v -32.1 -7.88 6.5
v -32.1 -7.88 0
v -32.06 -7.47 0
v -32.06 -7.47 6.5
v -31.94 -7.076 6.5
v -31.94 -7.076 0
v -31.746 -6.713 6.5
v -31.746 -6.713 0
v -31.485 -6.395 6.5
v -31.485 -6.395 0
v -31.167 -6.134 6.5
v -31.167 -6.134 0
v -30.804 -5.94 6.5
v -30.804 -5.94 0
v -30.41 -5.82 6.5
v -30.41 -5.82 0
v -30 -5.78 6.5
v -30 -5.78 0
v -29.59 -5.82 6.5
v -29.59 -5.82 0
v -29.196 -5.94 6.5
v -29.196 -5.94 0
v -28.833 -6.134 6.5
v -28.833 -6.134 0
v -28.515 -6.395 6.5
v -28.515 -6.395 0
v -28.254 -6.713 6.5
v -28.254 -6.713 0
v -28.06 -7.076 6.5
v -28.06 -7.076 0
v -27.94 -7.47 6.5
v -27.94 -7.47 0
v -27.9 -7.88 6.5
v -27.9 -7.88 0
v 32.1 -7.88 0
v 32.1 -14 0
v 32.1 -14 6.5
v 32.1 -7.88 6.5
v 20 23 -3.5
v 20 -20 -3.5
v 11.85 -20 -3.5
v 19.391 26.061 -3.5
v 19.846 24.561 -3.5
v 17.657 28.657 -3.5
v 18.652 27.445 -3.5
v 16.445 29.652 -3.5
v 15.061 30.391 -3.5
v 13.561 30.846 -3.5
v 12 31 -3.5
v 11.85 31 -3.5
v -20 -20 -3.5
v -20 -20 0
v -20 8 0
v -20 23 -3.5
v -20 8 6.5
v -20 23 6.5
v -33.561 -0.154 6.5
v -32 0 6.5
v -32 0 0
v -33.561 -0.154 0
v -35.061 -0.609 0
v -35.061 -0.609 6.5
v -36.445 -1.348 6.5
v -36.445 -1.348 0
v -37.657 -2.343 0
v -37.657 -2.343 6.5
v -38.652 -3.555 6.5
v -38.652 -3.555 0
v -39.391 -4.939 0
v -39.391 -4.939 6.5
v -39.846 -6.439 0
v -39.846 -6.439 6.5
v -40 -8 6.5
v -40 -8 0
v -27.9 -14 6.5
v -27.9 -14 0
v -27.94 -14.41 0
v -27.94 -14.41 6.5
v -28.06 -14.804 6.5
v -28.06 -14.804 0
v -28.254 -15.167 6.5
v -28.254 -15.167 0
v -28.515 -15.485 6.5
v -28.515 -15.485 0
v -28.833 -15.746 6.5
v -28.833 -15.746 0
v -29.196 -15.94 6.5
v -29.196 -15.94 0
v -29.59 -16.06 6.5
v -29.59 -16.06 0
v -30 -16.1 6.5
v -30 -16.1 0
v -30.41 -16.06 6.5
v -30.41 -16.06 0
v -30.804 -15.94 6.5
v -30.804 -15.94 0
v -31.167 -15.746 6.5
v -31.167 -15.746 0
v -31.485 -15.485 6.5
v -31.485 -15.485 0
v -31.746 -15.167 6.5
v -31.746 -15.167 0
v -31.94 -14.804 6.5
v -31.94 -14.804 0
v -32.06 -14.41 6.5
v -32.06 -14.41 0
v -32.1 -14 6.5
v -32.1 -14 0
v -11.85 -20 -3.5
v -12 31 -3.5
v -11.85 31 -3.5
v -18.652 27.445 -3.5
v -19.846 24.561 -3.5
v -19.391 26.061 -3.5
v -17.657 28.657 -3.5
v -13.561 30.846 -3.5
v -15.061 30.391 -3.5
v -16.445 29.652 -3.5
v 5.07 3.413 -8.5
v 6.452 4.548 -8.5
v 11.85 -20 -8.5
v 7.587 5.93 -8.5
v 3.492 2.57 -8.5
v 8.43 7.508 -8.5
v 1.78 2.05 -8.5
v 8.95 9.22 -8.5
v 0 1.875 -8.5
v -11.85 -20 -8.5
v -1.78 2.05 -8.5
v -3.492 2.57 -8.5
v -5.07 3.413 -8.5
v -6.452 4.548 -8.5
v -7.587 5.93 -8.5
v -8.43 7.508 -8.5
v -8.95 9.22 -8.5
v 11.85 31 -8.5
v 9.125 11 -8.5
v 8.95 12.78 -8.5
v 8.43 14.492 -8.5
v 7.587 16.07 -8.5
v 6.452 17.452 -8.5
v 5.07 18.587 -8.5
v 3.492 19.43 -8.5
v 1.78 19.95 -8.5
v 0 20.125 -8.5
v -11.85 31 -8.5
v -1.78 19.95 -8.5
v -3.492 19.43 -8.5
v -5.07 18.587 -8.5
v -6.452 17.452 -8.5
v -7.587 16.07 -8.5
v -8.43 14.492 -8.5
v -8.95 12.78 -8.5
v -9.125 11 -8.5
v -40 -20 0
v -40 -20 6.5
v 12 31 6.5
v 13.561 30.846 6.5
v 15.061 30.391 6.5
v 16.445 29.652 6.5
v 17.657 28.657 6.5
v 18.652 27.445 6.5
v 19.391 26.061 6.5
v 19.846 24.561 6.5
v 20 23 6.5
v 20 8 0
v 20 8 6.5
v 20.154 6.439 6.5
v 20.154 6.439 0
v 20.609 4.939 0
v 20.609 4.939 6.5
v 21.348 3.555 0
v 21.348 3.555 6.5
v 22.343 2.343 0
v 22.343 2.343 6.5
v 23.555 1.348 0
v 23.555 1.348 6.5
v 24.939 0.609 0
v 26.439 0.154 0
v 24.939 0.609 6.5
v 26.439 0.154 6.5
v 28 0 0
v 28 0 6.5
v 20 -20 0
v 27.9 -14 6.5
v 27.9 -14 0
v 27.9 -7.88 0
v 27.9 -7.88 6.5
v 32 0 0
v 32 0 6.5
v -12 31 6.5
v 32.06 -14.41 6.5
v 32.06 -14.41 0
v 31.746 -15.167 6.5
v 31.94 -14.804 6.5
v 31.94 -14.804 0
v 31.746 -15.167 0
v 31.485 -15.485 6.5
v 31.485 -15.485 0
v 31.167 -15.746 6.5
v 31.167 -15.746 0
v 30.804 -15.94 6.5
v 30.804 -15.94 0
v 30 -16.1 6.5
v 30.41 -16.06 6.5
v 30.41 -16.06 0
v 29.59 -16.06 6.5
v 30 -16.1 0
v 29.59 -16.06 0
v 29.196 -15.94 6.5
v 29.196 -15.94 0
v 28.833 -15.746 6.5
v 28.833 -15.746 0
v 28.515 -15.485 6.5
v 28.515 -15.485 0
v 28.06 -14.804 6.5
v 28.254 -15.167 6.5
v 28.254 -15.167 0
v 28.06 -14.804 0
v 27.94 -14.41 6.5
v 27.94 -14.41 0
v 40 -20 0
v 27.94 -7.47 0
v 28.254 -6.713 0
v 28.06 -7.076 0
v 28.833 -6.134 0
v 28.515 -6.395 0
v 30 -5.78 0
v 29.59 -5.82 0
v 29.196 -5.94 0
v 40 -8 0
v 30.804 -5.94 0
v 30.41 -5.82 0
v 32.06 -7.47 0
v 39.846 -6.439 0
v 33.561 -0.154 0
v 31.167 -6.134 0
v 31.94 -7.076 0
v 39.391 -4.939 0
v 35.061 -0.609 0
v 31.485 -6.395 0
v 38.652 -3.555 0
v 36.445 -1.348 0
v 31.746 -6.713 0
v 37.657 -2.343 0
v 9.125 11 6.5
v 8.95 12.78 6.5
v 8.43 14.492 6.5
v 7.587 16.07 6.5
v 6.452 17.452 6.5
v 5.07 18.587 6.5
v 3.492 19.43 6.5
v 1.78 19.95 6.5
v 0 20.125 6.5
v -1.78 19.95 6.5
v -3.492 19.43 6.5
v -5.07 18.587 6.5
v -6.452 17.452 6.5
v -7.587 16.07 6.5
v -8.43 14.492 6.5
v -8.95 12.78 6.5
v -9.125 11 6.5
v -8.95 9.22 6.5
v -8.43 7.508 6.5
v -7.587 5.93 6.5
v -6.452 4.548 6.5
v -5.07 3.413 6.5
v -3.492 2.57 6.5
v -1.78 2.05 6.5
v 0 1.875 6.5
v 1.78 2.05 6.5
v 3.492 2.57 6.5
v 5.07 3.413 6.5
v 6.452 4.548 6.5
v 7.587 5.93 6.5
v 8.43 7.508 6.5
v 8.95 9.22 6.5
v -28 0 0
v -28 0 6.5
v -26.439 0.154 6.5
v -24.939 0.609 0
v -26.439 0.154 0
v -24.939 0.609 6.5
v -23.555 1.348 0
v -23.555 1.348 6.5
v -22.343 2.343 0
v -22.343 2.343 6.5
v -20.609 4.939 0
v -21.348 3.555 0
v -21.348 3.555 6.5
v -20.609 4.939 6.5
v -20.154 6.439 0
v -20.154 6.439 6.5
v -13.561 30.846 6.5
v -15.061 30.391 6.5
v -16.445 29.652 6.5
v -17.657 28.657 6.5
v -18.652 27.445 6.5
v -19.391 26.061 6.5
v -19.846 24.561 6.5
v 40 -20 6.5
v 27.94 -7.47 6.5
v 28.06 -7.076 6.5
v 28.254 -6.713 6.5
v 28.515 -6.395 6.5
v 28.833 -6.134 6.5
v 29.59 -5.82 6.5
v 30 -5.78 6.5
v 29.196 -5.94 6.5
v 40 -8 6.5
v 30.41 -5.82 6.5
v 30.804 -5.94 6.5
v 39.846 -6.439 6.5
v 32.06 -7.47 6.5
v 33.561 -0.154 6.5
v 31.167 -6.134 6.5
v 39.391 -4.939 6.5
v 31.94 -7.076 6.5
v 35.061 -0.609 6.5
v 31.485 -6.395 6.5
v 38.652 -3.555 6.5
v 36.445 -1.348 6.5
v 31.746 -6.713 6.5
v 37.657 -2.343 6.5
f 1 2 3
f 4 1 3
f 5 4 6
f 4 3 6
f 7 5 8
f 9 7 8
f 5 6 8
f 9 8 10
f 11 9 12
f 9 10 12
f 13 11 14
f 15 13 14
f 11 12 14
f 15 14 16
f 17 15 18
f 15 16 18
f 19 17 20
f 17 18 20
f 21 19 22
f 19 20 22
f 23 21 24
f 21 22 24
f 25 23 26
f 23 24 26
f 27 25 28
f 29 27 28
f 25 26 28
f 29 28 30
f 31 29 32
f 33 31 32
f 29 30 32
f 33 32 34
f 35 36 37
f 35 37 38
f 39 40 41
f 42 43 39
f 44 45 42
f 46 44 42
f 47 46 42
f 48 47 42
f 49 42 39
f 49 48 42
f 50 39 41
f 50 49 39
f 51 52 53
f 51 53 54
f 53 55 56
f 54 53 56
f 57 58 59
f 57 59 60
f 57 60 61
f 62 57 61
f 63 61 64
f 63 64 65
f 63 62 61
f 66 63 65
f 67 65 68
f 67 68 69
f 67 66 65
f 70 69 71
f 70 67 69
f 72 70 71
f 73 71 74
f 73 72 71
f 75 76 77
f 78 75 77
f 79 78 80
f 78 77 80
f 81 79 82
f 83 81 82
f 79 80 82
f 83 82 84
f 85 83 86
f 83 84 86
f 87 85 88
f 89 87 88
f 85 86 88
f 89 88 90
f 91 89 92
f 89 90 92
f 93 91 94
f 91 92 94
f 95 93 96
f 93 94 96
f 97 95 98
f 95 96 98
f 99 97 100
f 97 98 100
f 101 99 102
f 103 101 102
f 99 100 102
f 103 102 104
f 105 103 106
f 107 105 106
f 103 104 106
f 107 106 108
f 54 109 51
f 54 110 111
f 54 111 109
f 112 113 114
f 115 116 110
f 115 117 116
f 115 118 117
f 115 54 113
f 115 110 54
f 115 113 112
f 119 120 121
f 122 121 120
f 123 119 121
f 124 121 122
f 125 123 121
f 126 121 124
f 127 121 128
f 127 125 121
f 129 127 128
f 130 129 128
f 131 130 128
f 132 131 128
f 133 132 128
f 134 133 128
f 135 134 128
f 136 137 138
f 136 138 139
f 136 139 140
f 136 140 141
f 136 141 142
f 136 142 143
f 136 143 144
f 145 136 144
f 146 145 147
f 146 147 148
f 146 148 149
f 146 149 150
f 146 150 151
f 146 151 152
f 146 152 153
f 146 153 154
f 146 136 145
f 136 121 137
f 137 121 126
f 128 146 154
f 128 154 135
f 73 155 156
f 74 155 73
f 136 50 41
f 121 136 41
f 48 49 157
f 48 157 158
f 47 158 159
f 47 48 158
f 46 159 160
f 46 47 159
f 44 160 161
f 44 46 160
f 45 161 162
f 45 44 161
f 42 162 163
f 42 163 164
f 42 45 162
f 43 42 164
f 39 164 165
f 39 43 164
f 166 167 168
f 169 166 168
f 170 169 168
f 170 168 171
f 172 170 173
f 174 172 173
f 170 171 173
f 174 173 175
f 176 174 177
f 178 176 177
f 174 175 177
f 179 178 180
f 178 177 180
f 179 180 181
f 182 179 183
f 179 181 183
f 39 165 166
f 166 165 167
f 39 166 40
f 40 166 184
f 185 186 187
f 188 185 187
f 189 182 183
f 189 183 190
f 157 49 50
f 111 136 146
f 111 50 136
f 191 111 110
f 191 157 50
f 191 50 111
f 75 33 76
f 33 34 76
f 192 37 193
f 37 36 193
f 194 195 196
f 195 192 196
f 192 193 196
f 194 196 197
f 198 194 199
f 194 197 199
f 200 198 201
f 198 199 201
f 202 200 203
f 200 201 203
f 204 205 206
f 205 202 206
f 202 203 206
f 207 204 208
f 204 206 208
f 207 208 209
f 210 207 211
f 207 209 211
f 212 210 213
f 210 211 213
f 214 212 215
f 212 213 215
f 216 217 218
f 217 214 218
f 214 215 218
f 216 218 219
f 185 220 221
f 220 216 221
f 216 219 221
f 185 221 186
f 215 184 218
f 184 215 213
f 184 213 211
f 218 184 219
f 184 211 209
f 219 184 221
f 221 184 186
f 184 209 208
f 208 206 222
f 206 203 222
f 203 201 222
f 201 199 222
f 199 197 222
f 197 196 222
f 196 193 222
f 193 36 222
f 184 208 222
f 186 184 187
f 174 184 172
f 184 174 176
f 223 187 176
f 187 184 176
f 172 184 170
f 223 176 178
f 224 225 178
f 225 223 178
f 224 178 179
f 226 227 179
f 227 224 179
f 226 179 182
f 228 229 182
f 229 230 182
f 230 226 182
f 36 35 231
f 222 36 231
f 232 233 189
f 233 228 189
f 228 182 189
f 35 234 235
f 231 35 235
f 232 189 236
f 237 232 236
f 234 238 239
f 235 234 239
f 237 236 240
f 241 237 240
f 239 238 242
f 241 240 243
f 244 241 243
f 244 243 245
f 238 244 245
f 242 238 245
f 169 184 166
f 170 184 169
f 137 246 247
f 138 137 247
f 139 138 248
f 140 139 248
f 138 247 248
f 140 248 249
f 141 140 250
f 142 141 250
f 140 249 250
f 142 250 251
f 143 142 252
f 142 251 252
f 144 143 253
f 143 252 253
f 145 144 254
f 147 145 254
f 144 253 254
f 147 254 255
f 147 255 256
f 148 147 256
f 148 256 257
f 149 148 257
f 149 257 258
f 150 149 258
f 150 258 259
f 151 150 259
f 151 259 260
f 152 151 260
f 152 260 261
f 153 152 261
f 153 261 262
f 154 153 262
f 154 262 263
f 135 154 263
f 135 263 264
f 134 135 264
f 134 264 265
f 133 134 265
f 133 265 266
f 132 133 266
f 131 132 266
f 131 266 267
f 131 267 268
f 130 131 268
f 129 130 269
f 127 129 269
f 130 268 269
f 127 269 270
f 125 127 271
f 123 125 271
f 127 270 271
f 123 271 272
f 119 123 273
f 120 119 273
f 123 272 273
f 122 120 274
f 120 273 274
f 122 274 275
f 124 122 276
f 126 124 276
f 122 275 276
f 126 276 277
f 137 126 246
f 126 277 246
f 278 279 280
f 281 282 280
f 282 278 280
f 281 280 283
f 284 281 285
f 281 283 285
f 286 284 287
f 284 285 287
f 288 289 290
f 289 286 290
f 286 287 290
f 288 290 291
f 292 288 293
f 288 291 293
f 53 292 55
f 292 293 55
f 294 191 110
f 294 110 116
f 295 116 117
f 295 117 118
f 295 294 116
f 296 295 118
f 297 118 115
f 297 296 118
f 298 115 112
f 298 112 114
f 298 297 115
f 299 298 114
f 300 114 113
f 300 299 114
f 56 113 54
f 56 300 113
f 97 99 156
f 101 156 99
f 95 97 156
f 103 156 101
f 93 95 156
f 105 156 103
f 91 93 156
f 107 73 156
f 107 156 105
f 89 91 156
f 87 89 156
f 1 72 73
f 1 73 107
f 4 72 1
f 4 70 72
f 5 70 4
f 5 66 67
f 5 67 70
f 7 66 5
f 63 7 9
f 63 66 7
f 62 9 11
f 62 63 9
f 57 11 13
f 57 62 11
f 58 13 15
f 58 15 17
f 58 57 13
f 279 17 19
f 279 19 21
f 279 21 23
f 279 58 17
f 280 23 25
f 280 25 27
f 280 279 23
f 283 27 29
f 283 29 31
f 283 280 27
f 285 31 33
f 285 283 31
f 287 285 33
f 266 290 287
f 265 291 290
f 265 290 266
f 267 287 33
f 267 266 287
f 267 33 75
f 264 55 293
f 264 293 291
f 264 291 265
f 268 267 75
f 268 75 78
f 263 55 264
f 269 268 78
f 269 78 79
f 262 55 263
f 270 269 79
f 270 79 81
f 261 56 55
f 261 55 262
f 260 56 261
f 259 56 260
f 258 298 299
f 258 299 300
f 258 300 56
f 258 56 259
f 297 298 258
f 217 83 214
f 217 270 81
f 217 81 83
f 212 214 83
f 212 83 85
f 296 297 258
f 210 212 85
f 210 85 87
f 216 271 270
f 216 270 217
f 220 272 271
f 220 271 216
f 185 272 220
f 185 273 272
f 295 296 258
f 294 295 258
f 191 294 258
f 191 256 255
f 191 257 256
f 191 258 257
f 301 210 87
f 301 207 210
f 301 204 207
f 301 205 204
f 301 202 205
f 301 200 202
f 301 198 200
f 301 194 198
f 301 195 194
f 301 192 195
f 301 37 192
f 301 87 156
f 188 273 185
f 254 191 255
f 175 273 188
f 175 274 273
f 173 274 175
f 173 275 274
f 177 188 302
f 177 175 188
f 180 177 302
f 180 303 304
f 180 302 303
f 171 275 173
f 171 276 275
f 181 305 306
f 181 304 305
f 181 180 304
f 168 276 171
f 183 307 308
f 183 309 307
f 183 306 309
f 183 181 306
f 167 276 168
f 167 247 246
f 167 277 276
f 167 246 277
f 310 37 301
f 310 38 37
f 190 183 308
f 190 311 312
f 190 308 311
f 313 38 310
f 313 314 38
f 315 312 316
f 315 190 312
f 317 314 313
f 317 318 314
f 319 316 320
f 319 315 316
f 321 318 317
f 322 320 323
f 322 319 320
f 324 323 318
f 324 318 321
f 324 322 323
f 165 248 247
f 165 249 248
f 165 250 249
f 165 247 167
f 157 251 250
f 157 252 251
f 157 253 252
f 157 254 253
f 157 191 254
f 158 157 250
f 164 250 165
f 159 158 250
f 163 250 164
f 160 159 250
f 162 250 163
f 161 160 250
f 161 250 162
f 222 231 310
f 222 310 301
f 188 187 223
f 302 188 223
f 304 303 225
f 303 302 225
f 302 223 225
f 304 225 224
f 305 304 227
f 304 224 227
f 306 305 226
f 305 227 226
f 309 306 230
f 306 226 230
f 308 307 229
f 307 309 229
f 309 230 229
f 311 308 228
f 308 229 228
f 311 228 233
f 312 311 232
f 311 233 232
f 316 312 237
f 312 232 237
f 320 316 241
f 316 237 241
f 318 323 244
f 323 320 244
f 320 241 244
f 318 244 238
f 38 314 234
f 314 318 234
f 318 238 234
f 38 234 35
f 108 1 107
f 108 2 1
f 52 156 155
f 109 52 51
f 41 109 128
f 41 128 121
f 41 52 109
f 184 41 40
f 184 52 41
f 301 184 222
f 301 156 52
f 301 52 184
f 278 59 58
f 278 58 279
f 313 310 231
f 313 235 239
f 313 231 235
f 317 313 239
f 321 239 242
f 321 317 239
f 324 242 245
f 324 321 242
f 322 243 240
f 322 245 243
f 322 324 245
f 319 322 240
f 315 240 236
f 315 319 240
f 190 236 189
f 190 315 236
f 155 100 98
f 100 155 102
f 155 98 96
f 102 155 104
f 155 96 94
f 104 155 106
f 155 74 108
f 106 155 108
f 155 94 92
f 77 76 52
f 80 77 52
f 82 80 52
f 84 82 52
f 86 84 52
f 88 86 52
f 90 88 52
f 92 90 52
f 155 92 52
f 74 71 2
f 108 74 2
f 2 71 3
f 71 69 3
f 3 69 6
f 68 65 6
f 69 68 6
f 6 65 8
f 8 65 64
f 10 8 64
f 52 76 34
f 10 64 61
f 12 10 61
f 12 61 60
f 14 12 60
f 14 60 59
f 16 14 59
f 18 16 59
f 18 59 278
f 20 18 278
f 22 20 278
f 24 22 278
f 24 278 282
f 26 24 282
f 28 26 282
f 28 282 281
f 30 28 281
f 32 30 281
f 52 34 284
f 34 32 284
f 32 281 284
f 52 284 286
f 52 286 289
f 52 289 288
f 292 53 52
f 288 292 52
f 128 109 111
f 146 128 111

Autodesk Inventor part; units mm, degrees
ref_plane "YZ Plane" through (0, 0, 0) normal (1, 0, 0) x (0, 1, 0)
ref_plane "XZ Plane" through (0, 0, 0) normal (0, 1, 0) x (-1, 0, 0)
ref_plane "XY Plane" through (0, 0, 0) normal (0, 0, 1) x (1, 0, 0)
sketch "Sketch1" plane through (0, 0, 0) normal (0, 0, 1) x (1, 0, 0)
  line L0 (-20, 31) -> (20, 31)
  line L1 (20, 31) -> (20, 0)
  line L2 (-20, 0) -> (-20, 31)
  line L3 (40, 0) -> (40, -20)
  line L4 (40, -20) -> (-40, -20)
  line L5 (-40, -20) -> (-40, 0)
  line L6 (-40, 0) -> (-20, 0)
  line L7 (20, 0) -> (40, 0)
  circle A0 centre (0, 11) radius 9.125
  point P0 (0, 0)
  point P1 (0, 31)
  point P2 (0, -20)
  dimension "d0" = 80
  dimension "d1" = 20
  dimension "d2" = 40
  dimension "d3" = 31
  dimension "d6" = 18.25
  dimension "d7" = 20
extrude "Extrusion1" add sketch "Sketch1" along normal blind 6.5 contours L0 L1 L7 L3 L4 L5 L6 L2 | A0
sketch "Sketch2" plane through (0, 0, 6.5) normal (0, 0, 1) x (1, 0, 0)
  circle A0 centre (0, 11) radius 9.125
  line L0 (20, 31) -> (-20, 31) projected
  point P0 (0, 0)
  dimension "d8" = 20
  dimension "d9" = 18.25
sketch "Sketch3" plane through (0, 0, 0) normal (0, 0, -1) x (-1, 0, 0)
  line L0 (-20, 31) -> (20, 31) projected
  line L1 (40, -20) -> (-40, -20) projected
  line L2 (20, 31) -> (-20, 31)
  line L3 (-20, 31) -> (-20, -20)
  line L4 (-20, -20) -> (20, -20)
  line L5 (20, -20) -> (20, 31)
  point P0 (0, 0)
  point P1 (-20, 5.5)
  point P2 (-20, 0)
extrude "Extrusion2" add sketch "Sketch3" along normal blind 3.5
sketch "Sketch4" plane through (0, 0, -3.5) normal (0, 0, -1) x (-1, 0, 0)
  line L0 (-20, 31) -> (20, 31) projected
  line L1 (-20, -20) -> (20, -20) projected
  line L2 (11.85, 31) -> (-11.85, 31)
  line L3 (-11.85, 31) -> (-11.85, -20)
  line L4 (-11.85, -20) -> (11.85, -20)
  line L5 (11.85, -20) -> (11.85, 31)
  point P0 (0, 0)
  point P1 (0, 31)
  dimension "d12" = 23.7
extrude "Extrusion3" add sketch "Sketch4" along normal blind 5
extrude "Extrusion4" cut sketch "Sketch2" against normal up to next
fillet "Fillet1" radius 8 6 edges at (-20, 31, 1.5) (-40, 0, 3.25) (20, 31, 1.5) (-20, 0, 3.25) (40, 0, 3.25) (20, 0, 3.25)
sketch "Sketch5" plane through (0, 0, 0) normal (0, 0, -1) x (-1, 0, 0)
  arc A0 (27.9, -14) -> (32.1, -14) centre (30, -14) ccw
  arc A1 (32.1, -7.88) -> (27.9, -7.88) centre (30, -7.88) ccw
  line L0 (32.1, -7.88) -> (32.1, -14)
  line L1 (27.9, -7.88) -> (27.9, -14)
  line L2 (40, -20) -> (40, -8) projected
  line L3 (20, -20) -> (40, -20) projected
  point P0 (0, 0)
  dimension "d18" = 4.2
  dimension "d19" = 6.12
  dimension "d20" = 10
  dimension "d21" = 6
extrude "Extrusion5" cut sketch "Sketch5" against normal up to next
mirror "Mirror1" about plane through (0, 0, 0) normal (1, 0, 0) of "Extrusion5"
properties part number "OldhamCouplerTop"
